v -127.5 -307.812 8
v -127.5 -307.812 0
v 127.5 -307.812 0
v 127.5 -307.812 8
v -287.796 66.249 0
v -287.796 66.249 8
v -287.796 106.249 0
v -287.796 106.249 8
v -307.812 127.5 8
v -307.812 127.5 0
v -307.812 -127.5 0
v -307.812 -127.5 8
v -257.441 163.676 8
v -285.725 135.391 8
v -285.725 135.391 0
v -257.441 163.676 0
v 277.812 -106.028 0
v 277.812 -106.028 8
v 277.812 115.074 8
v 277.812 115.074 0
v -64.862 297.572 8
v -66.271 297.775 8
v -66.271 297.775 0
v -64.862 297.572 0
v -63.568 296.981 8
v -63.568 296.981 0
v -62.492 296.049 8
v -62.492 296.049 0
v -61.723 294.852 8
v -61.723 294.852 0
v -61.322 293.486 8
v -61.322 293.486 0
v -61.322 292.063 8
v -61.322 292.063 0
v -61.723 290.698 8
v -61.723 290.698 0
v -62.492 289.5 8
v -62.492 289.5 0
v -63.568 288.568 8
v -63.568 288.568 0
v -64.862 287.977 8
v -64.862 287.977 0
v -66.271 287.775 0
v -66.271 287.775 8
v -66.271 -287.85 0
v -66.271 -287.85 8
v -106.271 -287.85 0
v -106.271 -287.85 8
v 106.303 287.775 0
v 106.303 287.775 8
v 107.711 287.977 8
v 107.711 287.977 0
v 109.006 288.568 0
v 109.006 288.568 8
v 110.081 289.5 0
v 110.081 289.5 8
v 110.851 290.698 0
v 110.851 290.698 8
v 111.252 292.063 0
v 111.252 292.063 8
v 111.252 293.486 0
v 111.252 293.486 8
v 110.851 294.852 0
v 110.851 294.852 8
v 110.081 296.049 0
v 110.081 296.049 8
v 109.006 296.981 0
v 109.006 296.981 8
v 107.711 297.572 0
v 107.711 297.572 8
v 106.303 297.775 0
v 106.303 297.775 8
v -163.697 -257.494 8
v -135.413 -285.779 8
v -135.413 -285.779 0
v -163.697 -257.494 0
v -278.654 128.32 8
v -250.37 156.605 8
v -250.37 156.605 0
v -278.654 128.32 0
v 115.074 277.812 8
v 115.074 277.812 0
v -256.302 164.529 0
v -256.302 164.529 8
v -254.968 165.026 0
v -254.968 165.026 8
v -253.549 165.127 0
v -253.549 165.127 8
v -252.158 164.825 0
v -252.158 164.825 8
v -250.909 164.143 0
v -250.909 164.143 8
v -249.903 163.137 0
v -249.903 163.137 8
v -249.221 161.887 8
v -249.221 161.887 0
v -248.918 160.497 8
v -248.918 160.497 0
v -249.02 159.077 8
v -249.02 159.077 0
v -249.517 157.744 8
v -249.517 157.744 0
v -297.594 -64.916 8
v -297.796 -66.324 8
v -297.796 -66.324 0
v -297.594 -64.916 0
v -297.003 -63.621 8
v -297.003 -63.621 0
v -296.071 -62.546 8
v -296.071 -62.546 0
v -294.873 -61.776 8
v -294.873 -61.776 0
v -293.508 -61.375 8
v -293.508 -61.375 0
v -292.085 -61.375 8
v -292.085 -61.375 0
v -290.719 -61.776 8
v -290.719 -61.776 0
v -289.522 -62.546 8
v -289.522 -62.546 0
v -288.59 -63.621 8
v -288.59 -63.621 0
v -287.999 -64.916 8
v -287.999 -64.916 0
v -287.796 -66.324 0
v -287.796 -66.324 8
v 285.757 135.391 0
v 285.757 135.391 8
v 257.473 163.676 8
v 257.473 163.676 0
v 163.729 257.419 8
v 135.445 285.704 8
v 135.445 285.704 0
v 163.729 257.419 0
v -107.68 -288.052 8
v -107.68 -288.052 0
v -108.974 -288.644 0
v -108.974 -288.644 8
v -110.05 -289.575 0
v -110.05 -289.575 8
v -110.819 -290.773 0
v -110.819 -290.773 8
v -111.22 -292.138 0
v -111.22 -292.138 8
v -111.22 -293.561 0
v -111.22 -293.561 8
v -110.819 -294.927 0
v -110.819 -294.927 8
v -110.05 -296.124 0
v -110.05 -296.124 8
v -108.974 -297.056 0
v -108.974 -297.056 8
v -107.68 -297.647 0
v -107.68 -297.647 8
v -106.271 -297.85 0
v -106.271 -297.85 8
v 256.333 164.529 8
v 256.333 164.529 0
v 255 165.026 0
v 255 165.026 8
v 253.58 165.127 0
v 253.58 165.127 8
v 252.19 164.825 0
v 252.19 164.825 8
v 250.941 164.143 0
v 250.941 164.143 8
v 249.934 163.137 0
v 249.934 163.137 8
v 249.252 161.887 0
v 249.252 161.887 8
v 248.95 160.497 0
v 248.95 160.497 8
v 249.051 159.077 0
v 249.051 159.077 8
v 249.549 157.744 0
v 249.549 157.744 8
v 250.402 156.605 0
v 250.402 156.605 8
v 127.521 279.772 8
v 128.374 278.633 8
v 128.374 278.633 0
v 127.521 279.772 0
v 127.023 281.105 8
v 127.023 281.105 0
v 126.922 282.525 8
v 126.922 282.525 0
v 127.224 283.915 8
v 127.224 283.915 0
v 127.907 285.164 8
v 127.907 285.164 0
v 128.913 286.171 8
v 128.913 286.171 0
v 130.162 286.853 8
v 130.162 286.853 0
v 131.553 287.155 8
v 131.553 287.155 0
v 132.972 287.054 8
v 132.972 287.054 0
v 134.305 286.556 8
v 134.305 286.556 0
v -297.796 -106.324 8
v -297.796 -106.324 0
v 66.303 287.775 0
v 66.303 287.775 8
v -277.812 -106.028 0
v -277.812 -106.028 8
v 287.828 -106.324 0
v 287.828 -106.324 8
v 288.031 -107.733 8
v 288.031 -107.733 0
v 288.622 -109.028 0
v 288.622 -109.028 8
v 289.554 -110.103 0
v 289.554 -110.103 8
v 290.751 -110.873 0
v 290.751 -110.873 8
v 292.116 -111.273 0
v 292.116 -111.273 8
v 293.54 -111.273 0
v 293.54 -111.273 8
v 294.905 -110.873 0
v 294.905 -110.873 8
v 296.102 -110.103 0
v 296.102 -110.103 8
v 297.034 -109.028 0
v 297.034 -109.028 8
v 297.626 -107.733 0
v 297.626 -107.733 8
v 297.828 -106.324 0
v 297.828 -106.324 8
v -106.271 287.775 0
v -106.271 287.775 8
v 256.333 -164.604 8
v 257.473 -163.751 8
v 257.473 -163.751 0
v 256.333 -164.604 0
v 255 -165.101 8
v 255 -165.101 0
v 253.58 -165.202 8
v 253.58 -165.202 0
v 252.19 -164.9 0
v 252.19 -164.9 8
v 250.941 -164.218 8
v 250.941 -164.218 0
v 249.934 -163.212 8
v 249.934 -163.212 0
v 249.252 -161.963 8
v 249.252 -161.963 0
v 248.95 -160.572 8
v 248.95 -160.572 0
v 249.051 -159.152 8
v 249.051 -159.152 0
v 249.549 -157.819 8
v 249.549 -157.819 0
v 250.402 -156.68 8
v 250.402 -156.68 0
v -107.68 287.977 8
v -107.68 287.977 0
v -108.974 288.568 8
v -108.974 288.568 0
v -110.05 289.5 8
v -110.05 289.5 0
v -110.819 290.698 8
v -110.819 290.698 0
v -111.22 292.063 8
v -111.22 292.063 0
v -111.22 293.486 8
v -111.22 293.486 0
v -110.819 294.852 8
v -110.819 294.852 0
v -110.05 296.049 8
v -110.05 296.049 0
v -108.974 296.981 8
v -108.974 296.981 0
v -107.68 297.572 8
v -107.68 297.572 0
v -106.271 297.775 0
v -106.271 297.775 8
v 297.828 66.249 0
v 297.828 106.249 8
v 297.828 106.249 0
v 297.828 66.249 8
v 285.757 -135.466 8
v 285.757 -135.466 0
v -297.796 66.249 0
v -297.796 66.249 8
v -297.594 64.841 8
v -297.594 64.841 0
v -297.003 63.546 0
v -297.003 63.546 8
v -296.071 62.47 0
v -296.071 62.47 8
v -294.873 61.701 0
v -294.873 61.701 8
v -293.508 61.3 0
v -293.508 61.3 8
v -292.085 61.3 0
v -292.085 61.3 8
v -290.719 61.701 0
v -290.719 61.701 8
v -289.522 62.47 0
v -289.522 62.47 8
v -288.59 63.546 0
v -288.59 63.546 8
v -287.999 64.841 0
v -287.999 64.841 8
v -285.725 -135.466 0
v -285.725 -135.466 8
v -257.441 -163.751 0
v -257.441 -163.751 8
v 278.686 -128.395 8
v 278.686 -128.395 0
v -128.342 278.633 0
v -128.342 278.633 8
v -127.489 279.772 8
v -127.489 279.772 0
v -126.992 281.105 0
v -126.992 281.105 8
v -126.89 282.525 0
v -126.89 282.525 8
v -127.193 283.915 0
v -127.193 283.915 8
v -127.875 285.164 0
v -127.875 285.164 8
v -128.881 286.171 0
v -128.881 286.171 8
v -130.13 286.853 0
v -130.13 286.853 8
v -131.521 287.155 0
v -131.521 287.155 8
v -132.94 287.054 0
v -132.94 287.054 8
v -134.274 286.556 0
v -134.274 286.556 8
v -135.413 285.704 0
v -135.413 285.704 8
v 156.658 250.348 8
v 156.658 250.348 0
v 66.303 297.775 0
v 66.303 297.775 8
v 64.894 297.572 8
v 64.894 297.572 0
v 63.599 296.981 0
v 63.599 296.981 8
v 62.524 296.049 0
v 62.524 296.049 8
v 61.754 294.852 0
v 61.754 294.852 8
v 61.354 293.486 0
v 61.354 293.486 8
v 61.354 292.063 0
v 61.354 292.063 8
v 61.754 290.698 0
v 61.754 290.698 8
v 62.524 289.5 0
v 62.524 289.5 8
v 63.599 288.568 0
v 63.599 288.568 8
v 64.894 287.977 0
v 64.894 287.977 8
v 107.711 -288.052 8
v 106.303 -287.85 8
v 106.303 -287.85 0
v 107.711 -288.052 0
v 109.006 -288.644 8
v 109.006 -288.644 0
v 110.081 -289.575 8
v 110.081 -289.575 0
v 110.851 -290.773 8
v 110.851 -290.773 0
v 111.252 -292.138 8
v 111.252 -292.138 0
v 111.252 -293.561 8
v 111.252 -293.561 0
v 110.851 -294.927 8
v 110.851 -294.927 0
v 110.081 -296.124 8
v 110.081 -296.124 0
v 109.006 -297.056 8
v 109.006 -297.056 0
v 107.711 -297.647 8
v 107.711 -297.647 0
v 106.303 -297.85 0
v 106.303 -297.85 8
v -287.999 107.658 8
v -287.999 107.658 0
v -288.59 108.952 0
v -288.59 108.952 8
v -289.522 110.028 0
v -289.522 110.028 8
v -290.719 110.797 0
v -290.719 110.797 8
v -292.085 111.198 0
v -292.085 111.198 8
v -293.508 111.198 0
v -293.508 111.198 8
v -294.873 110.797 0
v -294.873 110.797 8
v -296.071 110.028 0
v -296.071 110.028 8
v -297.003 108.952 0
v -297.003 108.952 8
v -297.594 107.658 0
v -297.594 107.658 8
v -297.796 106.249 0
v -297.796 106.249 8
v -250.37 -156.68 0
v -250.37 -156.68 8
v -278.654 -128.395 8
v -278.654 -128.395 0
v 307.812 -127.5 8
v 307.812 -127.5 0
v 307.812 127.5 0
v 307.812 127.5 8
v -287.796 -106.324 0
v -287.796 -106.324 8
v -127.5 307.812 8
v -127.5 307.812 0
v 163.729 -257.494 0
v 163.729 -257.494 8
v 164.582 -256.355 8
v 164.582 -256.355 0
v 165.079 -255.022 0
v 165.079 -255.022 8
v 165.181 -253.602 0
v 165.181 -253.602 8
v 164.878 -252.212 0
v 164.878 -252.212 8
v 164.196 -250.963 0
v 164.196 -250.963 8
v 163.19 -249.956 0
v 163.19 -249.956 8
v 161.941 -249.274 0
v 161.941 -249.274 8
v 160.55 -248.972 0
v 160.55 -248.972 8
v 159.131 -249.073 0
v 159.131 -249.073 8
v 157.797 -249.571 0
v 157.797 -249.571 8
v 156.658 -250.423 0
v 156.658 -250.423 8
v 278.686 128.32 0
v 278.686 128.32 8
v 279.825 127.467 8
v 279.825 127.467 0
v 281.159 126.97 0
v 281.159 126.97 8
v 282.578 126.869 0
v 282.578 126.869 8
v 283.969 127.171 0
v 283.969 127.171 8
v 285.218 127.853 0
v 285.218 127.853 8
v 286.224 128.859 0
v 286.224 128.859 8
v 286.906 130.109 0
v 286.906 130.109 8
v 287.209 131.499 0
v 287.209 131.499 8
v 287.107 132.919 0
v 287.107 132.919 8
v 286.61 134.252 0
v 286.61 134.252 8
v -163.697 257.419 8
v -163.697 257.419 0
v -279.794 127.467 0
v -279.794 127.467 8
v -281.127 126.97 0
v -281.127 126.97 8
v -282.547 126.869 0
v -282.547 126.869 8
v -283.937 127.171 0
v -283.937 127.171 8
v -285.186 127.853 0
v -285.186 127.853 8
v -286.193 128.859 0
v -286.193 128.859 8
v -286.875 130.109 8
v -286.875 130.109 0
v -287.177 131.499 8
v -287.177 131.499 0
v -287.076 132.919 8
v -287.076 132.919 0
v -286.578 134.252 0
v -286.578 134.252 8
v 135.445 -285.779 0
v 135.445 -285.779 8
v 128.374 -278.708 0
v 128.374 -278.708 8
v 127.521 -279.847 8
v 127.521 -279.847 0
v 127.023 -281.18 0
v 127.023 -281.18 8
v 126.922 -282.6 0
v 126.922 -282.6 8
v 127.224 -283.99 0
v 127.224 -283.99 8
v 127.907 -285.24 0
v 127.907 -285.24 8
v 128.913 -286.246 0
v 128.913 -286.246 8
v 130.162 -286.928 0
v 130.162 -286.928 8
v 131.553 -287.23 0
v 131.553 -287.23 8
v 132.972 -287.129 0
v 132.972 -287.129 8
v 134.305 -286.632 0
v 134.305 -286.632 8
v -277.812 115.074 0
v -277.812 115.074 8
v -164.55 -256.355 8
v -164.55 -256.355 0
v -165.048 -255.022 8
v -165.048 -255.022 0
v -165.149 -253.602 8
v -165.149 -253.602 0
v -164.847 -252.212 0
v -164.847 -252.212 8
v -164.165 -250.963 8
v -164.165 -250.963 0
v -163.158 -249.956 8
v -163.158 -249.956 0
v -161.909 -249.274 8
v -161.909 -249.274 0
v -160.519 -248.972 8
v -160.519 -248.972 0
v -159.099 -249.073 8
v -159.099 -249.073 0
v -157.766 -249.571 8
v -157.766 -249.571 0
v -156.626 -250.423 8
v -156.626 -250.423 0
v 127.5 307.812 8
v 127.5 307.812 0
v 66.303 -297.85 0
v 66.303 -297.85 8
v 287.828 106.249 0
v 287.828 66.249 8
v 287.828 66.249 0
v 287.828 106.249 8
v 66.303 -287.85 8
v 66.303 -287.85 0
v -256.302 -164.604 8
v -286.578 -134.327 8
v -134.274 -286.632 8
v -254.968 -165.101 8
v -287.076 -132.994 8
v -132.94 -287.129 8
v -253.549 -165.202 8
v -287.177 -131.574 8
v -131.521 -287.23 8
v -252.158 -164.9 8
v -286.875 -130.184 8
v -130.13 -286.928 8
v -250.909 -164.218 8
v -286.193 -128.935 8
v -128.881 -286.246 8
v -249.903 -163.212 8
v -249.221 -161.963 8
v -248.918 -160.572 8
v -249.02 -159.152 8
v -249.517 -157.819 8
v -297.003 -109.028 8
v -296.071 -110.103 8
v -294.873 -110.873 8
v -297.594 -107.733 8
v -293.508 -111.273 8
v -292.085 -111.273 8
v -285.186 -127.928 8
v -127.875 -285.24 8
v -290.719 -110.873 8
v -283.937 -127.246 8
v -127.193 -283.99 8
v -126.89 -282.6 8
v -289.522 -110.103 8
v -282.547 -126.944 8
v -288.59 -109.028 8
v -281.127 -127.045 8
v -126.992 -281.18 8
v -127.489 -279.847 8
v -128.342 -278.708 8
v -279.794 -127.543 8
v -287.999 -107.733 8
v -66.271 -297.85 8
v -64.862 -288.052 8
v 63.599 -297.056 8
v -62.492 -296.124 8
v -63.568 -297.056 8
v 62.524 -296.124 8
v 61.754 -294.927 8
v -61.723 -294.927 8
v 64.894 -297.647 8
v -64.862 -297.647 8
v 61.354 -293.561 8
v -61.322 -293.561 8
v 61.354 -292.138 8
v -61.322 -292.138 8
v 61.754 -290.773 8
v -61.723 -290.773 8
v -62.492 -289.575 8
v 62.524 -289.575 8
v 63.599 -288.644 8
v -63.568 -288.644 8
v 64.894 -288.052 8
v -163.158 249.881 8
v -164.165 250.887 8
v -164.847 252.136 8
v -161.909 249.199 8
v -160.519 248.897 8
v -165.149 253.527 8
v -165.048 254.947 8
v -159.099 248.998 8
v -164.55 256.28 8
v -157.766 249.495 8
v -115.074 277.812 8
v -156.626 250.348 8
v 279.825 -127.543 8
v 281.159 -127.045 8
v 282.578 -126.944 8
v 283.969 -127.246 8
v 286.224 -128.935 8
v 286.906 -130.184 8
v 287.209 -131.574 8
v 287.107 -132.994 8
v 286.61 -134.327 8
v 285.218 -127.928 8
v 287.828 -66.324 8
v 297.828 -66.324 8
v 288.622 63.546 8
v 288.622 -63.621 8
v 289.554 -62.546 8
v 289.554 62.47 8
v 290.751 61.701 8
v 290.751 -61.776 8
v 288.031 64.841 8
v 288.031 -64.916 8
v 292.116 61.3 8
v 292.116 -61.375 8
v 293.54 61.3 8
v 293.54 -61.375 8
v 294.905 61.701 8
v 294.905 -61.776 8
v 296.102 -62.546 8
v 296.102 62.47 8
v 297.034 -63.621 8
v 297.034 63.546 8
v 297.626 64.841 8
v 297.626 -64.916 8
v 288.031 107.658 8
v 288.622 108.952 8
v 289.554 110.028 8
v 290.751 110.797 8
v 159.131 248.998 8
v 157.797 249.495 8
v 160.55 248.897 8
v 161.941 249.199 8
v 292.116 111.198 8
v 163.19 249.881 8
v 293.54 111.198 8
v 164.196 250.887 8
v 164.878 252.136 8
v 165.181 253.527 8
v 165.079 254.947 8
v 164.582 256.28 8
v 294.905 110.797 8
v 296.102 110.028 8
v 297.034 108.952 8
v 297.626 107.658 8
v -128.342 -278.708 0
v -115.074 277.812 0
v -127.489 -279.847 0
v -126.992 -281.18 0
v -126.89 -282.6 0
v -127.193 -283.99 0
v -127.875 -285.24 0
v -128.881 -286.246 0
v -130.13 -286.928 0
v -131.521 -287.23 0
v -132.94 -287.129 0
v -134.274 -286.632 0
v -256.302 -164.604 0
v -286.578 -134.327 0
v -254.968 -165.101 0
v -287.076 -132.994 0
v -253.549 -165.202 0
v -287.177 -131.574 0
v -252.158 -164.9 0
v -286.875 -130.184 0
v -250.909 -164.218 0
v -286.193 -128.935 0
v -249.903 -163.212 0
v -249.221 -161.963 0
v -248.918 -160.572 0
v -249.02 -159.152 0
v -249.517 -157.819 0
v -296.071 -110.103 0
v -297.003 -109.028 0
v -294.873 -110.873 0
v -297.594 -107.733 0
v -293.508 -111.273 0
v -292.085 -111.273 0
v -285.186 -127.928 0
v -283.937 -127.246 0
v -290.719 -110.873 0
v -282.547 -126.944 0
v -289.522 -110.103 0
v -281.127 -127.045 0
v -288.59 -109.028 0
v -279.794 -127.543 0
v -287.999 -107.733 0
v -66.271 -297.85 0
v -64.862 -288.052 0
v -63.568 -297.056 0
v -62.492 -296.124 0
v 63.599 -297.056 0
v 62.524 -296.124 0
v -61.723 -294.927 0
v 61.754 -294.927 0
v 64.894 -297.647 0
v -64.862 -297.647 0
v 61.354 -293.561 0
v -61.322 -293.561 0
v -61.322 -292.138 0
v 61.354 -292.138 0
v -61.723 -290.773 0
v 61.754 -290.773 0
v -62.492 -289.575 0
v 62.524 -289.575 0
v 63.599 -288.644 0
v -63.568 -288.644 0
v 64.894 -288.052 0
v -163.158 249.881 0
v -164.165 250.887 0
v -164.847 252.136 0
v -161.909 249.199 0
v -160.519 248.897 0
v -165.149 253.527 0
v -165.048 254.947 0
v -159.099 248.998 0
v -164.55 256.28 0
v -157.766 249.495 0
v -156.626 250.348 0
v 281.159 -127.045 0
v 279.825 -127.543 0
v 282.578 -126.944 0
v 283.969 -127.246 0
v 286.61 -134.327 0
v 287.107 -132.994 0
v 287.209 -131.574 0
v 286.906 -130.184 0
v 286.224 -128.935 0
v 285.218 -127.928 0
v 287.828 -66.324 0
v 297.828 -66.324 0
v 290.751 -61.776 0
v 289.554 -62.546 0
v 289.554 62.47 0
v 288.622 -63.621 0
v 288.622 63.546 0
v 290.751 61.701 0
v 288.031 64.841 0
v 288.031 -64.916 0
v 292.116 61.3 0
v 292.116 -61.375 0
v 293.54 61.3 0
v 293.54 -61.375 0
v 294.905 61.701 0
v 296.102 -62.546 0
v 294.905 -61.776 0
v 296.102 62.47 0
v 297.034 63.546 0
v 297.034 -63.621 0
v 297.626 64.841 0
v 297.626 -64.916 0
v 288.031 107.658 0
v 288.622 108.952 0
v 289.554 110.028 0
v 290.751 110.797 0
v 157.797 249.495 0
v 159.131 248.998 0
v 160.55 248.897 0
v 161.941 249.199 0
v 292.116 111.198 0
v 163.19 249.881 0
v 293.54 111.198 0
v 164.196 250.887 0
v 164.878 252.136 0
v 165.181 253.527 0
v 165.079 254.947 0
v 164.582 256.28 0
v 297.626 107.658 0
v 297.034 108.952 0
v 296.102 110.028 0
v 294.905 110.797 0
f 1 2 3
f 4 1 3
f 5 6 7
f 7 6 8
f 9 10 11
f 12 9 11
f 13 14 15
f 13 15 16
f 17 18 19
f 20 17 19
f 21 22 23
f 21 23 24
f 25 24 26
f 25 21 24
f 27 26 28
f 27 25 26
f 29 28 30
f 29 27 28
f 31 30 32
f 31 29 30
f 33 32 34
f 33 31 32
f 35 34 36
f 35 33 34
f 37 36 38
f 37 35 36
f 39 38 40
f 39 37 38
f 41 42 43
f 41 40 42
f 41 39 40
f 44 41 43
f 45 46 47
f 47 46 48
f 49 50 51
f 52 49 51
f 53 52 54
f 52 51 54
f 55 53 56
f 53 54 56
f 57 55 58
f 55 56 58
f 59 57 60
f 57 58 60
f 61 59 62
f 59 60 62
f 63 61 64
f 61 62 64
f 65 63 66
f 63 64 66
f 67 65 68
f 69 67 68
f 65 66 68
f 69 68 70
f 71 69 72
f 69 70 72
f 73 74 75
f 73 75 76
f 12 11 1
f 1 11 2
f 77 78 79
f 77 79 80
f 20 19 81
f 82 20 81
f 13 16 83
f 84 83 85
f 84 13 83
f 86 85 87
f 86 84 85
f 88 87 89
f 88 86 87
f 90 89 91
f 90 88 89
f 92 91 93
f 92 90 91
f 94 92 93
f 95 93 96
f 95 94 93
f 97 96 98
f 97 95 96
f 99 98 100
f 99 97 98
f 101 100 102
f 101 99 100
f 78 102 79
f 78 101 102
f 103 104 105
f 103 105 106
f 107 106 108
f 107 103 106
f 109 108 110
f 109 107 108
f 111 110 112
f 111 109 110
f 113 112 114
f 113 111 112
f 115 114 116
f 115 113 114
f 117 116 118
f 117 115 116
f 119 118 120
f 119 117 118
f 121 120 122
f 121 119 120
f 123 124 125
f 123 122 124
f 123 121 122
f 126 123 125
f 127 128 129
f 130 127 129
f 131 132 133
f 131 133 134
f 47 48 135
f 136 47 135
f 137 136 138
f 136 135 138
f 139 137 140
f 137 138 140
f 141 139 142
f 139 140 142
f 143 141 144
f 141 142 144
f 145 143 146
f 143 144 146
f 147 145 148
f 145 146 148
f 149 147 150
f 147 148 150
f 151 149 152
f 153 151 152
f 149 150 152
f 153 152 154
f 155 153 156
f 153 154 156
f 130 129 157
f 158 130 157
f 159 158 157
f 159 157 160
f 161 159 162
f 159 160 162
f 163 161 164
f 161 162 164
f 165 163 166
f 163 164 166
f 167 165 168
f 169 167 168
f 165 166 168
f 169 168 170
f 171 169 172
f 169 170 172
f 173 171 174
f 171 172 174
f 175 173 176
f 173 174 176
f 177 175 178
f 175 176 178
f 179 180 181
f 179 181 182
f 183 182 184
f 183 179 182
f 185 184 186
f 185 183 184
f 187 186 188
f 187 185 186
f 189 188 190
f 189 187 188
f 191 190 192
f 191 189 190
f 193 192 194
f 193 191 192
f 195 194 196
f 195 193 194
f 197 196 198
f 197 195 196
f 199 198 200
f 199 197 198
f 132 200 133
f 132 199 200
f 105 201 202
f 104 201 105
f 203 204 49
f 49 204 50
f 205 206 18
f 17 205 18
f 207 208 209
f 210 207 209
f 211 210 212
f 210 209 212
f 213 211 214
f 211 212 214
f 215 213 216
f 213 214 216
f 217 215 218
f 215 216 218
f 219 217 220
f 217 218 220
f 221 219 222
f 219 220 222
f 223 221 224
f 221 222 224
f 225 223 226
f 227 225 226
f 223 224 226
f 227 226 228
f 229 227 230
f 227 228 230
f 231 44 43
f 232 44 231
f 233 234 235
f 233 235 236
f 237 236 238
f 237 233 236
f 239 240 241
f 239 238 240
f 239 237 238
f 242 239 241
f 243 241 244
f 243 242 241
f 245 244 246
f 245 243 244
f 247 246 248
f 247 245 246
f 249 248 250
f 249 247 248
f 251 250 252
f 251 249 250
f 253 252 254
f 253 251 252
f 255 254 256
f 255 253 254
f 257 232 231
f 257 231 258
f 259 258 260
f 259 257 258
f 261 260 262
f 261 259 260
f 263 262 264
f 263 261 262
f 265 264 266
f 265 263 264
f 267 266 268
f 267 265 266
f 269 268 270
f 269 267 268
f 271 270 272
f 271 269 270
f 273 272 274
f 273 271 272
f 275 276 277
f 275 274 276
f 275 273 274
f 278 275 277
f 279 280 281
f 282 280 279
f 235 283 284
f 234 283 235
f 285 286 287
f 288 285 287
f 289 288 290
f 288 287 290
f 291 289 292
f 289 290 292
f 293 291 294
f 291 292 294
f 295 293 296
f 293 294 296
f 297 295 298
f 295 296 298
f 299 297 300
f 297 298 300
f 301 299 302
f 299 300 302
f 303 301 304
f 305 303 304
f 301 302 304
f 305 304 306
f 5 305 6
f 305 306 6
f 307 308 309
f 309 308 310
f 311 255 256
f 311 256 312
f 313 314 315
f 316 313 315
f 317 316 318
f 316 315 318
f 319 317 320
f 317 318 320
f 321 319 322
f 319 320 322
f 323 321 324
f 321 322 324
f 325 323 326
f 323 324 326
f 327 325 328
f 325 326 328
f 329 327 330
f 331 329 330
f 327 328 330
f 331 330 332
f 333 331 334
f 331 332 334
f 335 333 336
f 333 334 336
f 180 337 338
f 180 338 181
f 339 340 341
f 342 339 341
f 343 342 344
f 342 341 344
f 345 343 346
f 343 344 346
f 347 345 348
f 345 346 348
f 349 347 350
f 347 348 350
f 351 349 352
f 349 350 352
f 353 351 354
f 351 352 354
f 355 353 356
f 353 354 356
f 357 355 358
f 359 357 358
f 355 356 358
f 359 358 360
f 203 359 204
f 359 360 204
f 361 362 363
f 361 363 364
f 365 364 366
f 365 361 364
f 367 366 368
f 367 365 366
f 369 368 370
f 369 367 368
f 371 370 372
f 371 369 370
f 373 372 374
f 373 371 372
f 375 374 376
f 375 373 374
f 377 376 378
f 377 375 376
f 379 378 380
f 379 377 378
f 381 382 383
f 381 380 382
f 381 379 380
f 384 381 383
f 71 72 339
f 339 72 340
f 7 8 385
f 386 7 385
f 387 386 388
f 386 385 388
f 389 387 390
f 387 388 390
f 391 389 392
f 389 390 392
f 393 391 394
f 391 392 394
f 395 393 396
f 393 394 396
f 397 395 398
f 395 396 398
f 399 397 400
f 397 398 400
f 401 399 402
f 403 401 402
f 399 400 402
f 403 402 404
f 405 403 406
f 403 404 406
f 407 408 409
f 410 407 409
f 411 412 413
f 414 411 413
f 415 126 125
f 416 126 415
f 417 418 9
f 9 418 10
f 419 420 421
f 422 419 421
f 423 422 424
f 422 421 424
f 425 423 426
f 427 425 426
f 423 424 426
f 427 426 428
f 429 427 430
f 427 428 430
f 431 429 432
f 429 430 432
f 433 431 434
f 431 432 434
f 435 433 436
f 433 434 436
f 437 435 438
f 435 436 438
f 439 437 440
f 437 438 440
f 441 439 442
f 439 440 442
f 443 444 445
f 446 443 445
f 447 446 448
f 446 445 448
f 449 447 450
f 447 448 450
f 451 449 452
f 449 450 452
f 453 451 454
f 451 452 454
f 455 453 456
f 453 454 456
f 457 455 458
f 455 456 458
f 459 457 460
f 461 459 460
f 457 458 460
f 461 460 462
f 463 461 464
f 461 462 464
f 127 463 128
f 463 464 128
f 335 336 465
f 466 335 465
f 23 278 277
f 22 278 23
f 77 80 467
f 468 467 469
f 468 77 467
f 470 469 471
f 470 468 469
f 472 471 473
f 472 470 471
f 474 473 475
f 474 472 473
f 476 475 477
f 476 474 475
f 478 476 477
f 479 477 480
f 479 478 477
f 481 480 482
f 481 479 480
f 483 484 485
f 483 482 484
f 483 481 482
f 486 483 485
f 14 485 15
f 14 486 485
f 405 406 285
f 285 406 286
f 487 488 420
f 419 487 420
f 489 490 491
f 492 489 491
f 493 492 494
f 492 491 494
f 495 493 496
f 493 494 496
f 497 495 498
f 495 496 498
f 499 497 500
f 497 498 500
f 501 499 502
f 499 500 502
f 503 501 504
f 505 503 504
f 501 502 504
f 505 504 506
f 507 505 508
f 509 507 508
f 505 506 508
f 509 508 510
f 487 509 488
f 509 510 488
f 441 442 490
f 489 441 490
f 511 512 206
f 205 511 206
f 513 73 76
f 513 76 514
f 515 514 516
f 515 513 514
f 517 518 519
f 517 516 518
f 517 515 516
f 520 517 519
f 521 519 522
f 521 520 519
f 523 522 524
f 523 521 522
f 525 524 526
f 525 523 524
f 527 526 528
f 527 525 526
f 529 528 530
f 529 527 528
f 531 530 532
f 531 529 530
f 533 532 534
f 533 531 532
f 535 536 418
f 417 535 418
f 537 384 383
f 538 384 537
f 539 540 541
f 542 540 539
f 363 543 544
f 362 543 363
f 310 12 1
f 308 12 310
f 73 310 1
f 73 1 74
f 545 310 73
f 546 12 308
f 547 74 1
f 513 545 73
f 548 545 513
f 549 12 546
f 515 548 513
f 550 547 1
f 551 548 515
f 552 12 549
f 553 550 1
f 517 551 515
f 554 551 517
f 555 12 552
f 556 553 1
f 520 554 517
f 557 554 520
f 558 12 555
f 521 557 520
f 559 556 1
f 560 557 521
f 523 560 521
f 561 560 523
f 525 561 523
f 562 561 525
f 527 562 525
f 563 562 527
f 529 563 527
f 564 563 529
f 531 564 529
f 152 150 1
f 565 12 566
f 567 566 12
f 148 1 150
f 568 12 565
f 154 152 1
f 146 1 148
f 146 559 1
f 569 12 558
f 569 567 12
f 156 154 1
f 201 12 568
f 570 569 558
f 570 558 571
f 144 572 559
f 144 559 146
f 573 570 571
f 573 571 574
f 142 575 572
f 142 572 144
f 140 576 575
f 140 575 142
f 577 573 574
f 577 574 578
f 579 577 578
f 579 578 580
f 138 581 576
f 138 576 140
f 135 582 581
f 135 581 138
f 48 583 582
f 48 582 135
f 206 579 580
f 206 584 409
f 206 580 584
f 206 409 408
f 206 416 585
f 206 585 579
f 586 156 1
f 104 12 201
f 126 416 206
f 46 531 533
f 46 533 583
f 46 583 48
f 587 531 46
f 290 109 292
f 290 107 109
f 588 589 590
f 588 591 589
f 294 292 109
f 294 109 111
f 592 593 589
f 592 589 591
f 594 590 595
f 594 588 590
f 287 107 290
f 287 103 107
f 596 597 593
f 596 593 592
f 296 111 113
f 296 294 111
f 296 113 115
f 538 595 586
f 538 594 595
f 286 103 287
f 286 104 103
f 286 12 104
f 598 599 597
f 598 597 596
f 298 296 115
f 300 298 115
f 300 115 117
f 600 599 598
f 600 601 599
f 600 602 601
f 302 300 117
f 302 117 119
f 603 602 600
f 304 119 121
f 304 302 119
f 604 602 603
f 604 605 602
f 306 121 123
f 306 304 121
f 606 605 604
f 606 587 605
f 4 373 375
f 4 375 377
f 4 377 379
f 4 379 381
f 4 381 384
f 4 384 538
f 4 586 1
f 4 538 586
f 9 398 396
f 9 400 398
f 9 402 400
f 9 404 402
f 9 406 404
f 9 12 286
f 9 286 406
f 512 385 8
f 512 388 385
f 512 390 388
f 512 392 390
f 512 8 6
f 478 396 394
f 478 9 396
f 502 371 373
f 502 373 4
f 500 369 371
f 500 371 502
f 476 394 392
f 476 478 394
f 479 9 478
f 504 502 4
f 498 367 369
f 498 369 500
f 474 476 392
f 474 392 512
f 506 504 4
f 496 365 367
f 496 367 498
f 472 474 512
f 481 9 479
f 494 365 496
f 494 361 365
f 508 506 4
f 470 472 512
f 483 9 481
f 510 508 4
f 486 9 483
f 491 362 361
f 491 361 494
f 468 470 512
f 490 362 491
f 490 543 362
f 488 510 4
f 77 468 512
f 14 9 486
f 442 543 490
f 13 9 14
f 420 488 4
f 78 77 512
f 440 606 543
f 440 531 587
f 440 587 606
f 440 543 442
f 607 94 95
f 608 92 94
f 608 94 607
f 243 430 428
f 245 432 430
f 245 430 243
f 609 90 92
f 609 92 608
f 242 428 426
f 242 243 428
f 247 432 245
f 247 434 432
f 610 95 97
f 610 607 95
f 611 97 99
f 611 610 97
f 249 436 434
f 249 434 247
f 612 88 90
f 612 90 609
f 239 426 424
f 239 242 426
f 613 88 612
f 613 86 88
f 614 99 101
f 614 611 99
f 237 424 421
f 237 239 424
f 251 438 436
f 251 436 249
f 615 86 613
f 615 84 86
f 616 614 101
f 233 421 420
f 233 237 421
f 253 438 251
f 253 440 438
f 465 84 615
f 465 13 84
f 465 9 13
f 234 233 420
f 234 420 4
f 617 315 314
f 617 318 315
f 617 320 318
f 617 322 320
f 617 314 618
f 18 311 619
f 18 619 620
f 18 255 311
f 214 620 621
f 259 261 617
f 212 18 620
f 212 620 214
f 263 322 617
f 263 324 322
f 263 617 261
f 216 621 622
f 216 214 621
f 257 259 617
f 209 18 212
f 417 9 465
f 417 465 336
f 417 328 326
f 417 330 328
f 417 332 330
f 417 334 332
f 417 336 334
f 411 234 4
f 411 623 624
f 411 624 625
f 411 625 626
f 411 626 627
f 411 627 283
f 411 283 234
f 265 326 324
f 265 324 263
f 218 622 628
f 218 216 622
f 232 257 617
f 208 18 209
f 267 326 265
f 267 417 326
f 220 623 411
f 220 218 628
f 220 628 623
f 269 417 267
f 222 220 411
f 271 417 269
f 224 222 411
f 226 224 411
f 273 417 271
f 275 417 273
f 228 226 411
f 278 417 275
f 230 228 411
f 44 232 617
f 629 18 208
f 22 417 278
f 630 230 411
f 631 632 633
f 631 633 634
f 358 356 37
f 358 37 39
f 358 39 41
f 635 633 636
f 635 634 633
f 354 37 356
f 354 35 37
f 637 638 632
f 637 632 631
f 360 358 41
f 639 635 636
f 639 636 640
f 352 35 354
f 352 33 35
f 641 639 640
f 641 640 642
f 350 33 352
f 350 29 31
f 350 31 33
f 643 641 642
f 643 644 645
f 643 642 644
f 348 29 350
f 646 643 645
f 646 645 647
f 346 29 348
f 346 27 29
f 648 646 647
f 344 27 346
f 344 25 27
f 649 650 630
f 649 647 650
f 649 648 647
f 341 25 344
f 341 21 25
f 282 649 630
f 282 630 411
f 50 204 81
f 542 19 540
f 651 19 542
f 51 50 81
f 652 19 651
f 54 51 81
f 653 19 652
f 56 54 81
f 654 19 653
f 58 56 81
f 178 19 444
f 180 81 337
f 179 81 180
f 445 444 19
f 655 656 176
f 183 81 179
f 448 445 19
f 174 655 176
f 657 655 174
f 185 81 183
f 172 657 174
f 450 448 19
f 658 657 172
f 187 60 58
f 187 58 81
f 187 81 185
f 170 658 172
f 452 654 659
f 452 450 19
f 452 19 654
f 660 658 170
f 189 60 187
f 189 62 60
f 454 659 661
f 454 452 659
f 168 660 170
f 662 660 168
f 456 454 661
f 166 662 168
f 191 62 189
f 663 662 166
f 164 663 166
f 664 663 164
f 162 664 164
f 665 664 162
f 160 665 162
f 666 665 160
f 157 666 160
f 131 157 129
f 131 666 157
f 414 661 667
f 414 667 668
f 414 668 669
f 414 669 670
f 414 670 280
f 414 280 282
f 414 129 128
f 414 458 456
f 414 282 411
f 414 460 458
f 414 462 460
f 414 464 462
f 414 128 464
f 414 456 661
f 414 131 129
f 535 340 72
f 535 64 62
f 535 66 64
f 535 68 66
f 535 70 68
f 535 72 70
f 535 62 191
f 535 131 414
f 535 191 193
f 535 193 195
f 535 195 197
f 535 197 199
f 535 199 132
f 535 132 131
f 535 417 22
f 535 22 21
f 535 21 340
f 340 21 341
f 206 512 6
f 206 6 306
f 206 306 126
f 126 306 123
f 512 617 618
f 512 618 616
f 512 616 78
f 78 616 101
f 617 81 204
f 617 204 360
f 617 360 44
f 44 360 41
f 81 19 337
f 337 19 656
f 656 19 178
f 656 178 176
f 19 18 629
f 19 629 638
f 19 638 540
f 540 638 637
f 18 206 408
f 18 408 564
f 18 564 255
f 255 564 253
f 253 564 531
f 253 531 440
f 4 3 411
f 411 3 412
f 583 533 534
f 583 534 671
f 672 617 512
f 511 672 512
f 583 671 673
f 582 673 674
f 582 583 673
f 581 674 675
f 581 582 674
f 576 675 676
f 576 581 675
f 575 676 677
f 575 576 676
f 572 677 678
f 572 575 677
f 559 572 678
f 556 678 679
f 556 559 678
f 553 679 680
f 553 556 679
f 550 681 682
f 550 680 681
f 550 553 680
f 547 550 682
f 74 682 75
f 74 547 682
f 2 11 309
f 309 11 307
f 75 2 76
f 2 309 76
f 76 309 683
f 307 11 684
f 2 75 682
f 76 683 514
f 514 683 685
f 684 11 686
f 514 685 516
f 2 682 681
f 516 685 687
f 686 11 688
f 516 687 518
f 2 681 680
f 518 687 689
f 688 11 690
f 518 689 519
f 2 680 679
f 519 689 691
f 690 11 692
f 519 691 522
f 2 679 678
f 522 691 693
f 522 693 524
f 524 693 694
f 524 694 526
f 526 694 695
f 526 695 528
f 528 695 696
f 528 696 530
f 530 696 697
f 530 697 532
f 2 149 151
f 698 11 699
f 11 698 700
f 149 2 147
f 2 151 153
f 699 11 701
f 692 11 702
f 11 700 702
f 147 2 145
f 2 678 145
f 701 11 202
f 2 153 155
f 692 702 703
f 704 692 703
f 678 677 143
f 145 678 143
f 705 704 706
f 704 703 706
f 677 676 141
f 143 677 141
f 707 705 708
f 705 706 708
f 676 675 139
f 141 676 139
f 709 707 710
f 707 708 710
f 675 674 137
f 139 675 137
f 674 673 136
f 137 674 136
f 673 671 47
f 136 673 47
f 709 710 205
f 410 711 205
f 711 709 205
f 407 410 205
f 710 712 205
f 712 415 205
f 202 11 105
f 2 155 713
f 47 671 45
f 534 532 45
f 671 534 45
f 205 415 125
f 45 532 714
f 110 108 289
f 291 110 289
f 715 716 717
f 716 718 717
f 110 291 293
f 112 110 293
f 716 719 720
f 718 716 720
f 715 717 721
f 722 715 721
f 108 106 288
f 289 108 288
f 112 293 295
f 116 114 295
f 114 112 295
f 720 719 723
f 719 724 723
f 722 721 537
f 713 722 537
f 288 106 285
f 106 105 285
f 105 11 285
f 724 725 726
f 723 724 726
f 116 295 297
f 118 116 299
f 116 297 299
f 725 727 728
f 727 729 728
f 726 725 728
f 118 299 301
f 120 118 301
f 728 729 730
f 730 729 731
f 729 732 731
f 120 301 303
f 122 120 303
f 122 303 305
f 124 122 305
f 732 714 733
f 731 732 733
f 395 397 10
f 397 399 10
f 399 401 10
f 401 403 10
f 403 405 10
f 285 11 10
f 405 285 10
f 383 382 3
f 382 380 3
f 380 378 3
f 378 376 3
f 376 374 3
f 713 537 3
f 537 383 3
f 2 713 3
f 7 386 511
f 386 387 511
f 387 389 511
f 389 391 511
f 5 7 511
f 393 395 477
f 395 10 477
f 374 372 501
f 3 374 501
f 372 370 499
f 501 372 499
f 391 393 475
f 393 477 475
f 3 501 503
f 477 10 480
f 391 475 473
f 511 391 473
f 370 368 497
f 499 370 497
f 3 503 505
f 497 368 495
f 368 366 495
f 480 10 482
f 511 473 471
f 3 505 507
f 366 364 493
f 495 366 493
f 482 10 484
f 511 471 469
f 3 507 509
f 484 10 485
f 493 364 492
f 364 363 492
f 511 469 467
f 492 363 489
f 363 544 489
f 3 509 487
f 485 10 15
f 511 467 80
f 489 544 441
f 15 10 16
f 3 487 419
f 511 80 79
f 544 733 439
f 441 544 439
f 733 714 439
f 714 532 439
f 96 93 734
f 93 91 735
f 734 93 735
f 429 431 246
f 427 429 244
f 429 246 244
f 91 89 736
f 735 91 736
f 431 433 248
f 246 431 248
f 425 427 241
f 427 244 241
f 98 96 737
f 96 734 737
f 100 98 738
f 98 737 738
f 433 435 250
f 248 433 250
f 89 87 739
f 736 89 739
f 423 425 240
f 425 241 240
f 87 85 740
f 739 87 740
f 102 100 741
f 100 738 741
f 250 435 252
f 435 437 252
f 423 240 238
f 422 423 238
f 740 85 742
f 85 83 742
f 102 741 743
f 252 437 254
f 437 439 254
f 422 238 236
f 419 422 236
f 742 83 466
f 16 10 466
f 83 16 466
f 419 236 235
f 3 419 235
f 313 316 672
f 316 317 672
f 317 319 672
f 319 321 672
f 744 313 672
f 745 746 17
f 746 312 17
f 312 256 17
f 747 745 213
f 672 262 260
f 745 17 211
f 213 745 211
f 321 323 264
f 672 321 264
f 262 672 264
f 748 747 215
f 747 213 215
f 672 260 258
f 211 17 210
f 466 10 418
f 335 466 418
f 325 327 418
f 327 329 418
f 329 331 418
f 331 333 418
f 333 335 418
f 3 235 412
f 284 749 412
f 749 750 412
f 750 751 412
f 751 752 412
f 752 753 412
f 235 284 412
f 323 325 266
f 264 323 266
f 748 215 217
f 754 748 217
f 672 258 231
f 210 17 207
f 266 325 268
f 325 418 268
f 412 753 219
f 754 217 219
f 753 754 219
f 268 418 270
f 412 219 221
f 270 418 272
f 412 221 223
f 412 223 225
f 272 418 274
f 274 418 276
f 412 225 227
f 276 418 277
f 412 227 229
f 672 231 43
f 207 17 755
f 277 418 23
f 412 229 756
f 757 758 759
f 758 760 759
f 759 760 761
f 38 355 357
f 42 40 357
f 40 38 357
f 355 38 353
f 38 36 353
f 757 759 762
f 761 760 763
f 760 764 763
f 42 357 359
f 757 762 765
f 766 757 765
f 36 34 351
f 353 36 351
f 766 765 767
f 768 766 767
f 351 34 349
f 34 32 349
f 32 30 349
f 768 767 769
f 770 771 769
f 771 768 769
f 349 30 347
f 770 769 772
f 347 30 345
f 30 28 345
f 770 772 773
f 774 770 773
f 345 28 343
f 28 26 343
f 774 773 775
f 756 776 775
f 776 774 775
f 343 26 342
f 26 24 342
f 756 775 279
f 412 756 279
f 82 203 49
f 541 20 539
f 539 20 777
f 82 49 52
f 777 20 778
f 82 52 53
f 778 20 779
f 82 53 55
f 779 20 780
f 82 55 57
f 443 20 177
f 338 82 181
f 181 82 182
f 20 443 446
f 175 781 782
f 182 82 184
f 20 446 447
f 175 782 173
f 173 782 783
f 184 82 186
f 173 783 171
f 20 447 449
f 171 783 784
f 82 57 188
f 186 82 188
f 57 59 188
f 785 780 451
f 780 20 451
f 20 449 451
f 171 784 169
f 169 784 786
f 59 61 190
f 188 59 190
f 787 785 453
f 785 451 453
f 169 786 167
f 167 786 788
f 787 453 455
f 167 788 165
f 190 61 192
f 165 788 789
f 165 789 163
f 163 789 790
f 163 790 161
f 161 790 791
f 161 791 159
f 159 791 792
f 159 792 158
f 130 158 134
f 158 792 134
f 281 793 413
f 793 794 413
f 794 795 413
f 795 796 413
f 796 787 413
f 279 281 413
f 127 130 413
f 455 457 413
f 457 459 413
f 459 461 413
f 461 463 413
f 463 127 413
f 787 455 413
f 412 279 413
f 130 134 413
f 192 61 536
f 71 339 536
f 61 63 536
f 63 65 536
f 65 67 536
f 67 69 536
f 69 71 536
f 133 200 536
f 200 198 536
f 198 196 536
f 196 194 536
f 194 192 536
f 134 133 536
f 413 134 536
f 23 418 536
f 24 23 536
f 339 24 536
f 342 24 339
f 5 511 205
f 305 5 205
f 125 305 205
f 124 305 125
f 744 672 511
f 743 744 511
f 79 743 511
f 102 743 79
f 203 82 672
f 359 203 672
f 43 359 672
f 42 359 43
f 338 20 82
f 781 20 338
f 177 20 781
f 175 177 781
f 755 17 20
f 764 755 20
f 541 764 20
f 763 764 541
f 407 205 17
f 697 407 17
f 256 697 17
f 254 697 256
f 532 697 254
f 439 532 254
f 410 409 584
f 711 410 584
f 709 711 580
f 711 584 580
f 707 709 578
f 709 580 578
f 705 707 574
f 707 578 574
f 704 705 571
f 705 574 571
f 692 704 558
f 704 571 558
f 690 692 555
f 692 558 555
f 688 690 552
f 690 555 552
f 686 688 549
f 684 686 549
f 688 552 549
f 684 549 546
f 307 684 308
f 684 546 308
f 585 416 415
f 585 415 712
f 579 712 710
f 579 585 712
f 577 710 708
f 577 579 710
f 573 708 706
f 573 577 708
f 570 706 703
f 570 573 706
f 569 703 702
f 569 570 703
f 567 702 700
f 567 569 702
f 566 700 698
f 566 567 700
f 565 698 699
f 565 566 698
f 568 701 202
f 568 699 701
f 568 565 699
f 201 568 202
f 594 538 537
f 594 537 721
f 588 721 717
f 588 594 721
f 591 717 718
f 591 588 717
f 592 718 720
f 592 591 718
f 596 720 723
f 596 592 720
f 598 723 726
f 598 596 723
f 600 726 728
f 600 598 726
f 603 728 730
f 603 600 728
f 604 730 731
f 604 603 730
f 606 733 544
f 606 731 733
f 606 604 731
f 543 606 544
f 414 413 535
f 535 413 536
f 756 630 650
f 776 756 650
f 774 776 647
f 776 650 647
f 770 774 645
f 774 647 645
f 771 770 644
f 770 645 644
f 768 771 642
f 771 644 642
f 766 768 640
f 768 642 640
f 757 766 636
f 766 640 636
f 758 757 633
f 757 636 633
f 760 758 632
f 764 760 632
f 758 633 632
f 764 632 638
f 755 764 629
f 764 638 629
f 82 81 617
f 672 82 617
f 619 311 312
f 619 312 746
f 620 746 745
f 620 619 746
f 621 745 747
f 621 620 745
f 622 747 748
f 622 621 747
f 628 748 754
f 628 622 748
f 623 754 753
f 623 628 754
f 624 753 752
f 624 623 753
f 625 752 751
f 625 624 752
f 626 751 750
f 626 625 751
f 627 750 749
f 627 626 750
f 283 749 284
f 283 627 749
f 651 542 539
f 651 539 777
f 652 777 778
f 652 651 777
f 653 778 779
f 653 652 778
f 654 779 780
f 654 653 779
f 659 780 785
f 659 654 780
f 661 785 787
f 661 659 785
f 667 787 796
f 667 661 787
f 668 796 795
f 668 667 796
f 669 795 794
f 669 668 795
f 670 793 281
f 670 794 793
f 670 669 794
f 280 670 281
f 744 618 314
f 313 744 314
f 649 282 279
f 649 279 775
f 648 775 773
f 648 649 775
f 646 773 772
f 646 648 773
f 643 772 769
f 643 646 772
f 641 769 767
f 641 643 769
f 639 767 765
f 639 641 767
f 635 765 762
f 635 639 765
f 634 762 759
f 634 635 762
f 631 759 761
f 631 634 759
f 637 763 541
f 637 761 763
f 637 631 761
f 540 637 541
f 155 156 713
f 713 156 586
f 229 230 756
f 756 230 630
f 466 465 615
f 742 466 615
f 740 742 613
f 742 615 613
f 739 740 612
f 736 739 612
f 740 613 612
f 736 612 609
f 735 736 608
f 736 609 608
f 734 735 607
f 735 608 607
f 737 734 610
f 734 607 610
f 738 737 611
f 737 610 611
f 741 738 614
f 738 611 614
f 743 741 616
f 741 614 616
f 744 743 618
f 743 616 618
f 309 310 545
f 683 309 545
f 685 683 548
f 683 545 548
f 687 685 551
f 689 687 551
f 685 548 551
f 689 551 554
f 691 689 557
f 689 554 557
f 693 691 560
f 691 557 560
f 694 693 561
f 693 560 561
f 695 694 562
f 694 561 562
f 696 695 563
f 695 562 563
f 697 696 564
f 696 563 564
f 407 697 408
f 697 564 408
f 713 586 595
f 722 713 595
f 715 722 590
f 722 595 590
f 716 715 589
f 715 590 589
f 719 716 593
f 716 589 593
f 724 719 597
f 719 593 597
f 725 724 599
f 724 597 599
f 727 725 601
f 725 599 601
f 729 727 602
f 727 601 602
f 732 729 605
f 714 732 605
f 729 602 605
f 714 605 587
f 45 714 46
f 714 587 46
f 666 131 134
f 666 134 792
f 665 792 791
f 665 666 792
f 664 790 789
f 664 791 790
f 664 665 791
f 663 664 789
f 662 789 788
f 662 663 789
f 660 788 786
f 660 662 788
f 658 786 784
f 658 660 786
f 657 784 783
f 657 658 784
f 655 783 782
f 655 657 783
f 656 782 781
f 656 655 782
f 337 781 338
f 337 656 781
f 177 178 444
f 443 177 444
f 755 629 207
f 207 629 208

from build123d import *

# Parameters (mm, degrees)
BOSS_EXTRUDE1_DEPTH     = 8
ENL_V_MAT_EXTRU_2_DEPTH = 10
ENL_V_MAT_EXTRU_3_DEPTH = 10


with BuildPart() as part:
    # Sketch1 → Boss-Extrude1 (new body)
    with BuildSketch(Plane.XY):
        Polygon((307.812229203, -127.5), (307.812229203, 127.5), (127.5, 307.812229203), (-127.5, 307.812229203), (-307.812229203, 127.5), (-307.812229203, -127.5), (-127.5, -307.812229203), (127.5, -307.812229203), align=None)
    extrude(amount=BOSS_EXTRUDE1_DEPTH)

    # Esquisse2 → Enlèv. mat.-Extru.2 (cut)
    with BuildSketch(Plane.XY.offset(8)):
        Polygon((-277.812229203, 115.073593129), (-277.812229203, -106.028471395), (277.812229203, -106.028471395), (277.812229203, 115.073593129), (115.073593129, 277.812229203), (-115.073593129, 277.812229203), align=None)
    extrude(amount=-ENL_V_MAT_EXTRU_2_DEPTH, mode=Mode.SUBTRACT)

    # Esquisse3 → Enlèv. mat.-Extru.3 (cut)
    with BuildSketch(Plane.XY.offset(8)):
        with BuildLine():
            Line((-285.725345882, 135.391380688), (-257.441074635, 163.675651935))
            ThreePointArc((-257.441074635, 163.675651935), (-250.370006823, 163.675651935), (-250.370006823, 156.604584124))
            Line((-250.370006823, 156.604584124), (-278.65427807, 128.320312876))
            ThreePointArc((-278.65427807, 128.320312876), (-285.725345882, 128.320312876), (-285.725345882, 135.391380688))
        make_face()
        with BuildLine():
            Line((-135.413116679, 285.703609891), (-163.697387927, 257.419338643))
            ThreePointArc((-163.697387927, 257.419338643), (-163.697387927, 250.348270831), (-156.626320115, 250.348270831))
            Line((-156.626320115, 250.348270831), (-128.342048868, 278.632542079))
            ThreePointArc((-128.342048868, 278.632542079), (-128.342048868, 285.703609891), (-135.413116679, 285.703609891))
        make_face()
        with BuildLine():
            Line((-106.270981056, 297.774677702), (-66.270981056, 297.774677702))
            ThreePointArc((-66.270981056, 297.774677702), (-61.270981056, 292.774677702), (-66.270981056, 287.774677702))
            Line((-66.270981056, 287.774677702), (-106.270981056, 287.774677702))
            ThreePointArc((-106.270981056, 287.774677702), (-111.270981056, 292.774677702), (-106.270981056, 297.774677702))
        make_face()
        with BuildLine():
            Line((106.302612073, 297.774677702), (66.302612073, 297.774677702))
            ThreePointArc((66.302612073, 297.774677702), (61.302612073, 292.774677702), (66.302612073, 287.774677702))
            Line((66.302612073, 287.774677702), (106.302612073, 287.774677702))
            ThreePointArc((106.302612073, 287.774677702), (111.302612073, 292.774677702), (106.302612073, 297.774677702))
        make_face()
        with BuildLine():
            Line((-297.796413694, 106.249245064), (-297.796413694, 66.249245064))
            ThreePointArc((-297.796413694, 66.249245064), (-292.796413694, 61.249245064), (-287.796413694, 66.249245064))
            Line((-287.796413694, 66.249245064), (-287.796413694, 106.249245064))
            ThreePointArc((-287.796413694, 106.249245064), (-292.796413694, 111.249245064), (-297.796413694, 106.249245064))
        make_face()
        with BuildLine():
            Line((-297.796413694, -106.324348065), (-297.796413694, -66.324348065))
            ThreePointArc((-297.796413694, -66.324348065), (-292.796413694, -61.324348065), (-287.796413694, -66.324348065))
            Line((-287.796413694, -66.324348065), (-287.796413694, -106.324348065))
            ThreePointArc((-287.796413694, -106.324348065), (-292.796413694, -111.324348065), (-297.796413694, -106.324348065))
        make_face()
        with BuildLine():
            Line((285.756976899, -135.466483688), (257.472705652, -163.750754936))
            ThreePointArc((257.472705652, -163.750754936), (250.40163784, -163.750754936), (250.40163784, -156.679687124))
            Line((250.40163784, -156.679687124), (278.685909088, -128.395415876))
            ThreePointArc((278.685909088, -128.395415876), (285.756976899, -128.395415876), (285.756976899, -135.466483688))
        make_face()
        with BuildLine():
            Line((135.444747697, -285.778712891), (163.729018944, -257.494441643))
            ThreePointArc((163.729018944, -257.494441643), (163.729018944, -250.423373832), (156.657951132, -250.423373832))
            Line((156.657951132, -250.423373832), (128.373679885, -278.707645079))
            ThreePointArc((128.373679885, -278.707645079), (128.373679885, -285.778712891), (135.444747697, -285.778712891))
        make_face()
        with BuildLine():
            Line((106.302612073, -297.849780703), (66.302612073, -297.849780703))
            ThreePointArc((66.302612073, -297.849780703), (61.302612073, -292.849780703), (66.302612073, -287.849780703))
            Line((66.302612073, -287.849780703), (106.302612073, -287.849780703))
            ThreePointArc((106.302612073, -287.849780703), (111.302612073, -292.849780703), (106.302612073, -297.849780703))
        make_face()
        with BuildLine():
            Line((-106.270981056, -297.849780703), (-66.270981056, -297.849780703))
            ThreePointArc((-66.270981056, -297.849780703), (-61.270981056, -292.849780703), (-66.270981056, -287.849780703))
            Line((-66.270981056, -287.849780703), (-106.270981056, -287.849780703))
            ThreePointArc((-106.270981056, -287.849780703), (-111.270981056, -292.849780703), (-106.270981056, -297.849780703))
        make_face()
        with BuildLine():
            Line((-135.413116679, -285.778712891), (-163.697387927, -257.494441643))
            ThreePointArc((-163.697387927, -257.494441643), (-163.697387927, -250.423373832), (-156.626320115, -250.423373832))
            Line((-156.626320115, -250.423373832), (-128.342048868, -278.707645079))
            ThreePointArc((-128.342048868, -278.707645079), (-128.342048868, -285.778712891), (-135.413116679, -285.778712891))
        make_face()
        with BuildLine():
            Line((-285.725345882, -135.466483688), (-257.441074635, -163.750754936))
            ThreePointArc((-257.441074635, -163.750754936), (-250.370006823, -163.750754936), (-250.370006823, -156.679687124))
            Line((-250.370006823, -156.679687124), (-278.65427807, -128.395415876))
            ThreePointArc((-278.65427807, -128.395415876), (-285.725345882, -128.395415876), (-285.725345882, -135.466483688))
        make_face()
        with BuildLine():
            Line((297.828044711, -106.324348065), (297.828044711, -66.324348065))
            ThreePointArc((297.828044711, -66.324348065), (292.828044711, -61.324348065), (287.828044711, -66.324348065))
            Line((287.828044711, -66.324348065), (287.828044711, -106.324348065))
            ThreePointArc((287.828044711, -106.324348065), (292.828044711, -111.324348065), (297.828044711, -106.324348065))
        make_face()
        with BuildLine():
            Line((297.828044711, 106.249245064), (297.828044711, 66.249245064))
            ThreePointArc((297.828044711, 66.249245064), (292.828044711, 61.249245064), (287.828044711, 66.249245064))
            Line((287.828044711, 66.249245064), (287.828044711, 106.249245064))
            ThreePointArc((287.828044711, 106.249245064), (292.828044711, 111.249245064), (297.828044711, 106.249245064))
        make_face()
        with BuildLine():
            Line((135.444747697, 285.703609891), (163.729018944, 257.419338643))
            ThreePointArc((163.729018944, 257.419338643), (163.729018944, 250.348270831), (156.657951132, 250.348270831))
            Line((156.657951132, 250.348270831), (128.373679885, 278.632542079))
            ThreePointArc((128.373679885, 278.632542079), (128.373679885, 285.703609891), (135.444747697, 285.703609891))
        make_face()
        with BuildLine():
            Line((285.756976899, 135.391380688), (257.472705652, 163.675651935))
            ThreePointArc((257.472705652, 163.675651935), (250.40163784, 163.675651935), (250.40163784, 156.604584124))
            Line((250.40163784, 156.604584124), (278.685909088, 128.320312876))
            ThreePointArc((278.685909088, 128.320312876), (285.756976899, 128.320312876), (285.756976899, 135.391380688))
        make_face()
    extrude(amount=-ENL_V_MAT_EXTRU_3_DEPTH, mode=Mode.SUBTRACT)


solid = part.part
